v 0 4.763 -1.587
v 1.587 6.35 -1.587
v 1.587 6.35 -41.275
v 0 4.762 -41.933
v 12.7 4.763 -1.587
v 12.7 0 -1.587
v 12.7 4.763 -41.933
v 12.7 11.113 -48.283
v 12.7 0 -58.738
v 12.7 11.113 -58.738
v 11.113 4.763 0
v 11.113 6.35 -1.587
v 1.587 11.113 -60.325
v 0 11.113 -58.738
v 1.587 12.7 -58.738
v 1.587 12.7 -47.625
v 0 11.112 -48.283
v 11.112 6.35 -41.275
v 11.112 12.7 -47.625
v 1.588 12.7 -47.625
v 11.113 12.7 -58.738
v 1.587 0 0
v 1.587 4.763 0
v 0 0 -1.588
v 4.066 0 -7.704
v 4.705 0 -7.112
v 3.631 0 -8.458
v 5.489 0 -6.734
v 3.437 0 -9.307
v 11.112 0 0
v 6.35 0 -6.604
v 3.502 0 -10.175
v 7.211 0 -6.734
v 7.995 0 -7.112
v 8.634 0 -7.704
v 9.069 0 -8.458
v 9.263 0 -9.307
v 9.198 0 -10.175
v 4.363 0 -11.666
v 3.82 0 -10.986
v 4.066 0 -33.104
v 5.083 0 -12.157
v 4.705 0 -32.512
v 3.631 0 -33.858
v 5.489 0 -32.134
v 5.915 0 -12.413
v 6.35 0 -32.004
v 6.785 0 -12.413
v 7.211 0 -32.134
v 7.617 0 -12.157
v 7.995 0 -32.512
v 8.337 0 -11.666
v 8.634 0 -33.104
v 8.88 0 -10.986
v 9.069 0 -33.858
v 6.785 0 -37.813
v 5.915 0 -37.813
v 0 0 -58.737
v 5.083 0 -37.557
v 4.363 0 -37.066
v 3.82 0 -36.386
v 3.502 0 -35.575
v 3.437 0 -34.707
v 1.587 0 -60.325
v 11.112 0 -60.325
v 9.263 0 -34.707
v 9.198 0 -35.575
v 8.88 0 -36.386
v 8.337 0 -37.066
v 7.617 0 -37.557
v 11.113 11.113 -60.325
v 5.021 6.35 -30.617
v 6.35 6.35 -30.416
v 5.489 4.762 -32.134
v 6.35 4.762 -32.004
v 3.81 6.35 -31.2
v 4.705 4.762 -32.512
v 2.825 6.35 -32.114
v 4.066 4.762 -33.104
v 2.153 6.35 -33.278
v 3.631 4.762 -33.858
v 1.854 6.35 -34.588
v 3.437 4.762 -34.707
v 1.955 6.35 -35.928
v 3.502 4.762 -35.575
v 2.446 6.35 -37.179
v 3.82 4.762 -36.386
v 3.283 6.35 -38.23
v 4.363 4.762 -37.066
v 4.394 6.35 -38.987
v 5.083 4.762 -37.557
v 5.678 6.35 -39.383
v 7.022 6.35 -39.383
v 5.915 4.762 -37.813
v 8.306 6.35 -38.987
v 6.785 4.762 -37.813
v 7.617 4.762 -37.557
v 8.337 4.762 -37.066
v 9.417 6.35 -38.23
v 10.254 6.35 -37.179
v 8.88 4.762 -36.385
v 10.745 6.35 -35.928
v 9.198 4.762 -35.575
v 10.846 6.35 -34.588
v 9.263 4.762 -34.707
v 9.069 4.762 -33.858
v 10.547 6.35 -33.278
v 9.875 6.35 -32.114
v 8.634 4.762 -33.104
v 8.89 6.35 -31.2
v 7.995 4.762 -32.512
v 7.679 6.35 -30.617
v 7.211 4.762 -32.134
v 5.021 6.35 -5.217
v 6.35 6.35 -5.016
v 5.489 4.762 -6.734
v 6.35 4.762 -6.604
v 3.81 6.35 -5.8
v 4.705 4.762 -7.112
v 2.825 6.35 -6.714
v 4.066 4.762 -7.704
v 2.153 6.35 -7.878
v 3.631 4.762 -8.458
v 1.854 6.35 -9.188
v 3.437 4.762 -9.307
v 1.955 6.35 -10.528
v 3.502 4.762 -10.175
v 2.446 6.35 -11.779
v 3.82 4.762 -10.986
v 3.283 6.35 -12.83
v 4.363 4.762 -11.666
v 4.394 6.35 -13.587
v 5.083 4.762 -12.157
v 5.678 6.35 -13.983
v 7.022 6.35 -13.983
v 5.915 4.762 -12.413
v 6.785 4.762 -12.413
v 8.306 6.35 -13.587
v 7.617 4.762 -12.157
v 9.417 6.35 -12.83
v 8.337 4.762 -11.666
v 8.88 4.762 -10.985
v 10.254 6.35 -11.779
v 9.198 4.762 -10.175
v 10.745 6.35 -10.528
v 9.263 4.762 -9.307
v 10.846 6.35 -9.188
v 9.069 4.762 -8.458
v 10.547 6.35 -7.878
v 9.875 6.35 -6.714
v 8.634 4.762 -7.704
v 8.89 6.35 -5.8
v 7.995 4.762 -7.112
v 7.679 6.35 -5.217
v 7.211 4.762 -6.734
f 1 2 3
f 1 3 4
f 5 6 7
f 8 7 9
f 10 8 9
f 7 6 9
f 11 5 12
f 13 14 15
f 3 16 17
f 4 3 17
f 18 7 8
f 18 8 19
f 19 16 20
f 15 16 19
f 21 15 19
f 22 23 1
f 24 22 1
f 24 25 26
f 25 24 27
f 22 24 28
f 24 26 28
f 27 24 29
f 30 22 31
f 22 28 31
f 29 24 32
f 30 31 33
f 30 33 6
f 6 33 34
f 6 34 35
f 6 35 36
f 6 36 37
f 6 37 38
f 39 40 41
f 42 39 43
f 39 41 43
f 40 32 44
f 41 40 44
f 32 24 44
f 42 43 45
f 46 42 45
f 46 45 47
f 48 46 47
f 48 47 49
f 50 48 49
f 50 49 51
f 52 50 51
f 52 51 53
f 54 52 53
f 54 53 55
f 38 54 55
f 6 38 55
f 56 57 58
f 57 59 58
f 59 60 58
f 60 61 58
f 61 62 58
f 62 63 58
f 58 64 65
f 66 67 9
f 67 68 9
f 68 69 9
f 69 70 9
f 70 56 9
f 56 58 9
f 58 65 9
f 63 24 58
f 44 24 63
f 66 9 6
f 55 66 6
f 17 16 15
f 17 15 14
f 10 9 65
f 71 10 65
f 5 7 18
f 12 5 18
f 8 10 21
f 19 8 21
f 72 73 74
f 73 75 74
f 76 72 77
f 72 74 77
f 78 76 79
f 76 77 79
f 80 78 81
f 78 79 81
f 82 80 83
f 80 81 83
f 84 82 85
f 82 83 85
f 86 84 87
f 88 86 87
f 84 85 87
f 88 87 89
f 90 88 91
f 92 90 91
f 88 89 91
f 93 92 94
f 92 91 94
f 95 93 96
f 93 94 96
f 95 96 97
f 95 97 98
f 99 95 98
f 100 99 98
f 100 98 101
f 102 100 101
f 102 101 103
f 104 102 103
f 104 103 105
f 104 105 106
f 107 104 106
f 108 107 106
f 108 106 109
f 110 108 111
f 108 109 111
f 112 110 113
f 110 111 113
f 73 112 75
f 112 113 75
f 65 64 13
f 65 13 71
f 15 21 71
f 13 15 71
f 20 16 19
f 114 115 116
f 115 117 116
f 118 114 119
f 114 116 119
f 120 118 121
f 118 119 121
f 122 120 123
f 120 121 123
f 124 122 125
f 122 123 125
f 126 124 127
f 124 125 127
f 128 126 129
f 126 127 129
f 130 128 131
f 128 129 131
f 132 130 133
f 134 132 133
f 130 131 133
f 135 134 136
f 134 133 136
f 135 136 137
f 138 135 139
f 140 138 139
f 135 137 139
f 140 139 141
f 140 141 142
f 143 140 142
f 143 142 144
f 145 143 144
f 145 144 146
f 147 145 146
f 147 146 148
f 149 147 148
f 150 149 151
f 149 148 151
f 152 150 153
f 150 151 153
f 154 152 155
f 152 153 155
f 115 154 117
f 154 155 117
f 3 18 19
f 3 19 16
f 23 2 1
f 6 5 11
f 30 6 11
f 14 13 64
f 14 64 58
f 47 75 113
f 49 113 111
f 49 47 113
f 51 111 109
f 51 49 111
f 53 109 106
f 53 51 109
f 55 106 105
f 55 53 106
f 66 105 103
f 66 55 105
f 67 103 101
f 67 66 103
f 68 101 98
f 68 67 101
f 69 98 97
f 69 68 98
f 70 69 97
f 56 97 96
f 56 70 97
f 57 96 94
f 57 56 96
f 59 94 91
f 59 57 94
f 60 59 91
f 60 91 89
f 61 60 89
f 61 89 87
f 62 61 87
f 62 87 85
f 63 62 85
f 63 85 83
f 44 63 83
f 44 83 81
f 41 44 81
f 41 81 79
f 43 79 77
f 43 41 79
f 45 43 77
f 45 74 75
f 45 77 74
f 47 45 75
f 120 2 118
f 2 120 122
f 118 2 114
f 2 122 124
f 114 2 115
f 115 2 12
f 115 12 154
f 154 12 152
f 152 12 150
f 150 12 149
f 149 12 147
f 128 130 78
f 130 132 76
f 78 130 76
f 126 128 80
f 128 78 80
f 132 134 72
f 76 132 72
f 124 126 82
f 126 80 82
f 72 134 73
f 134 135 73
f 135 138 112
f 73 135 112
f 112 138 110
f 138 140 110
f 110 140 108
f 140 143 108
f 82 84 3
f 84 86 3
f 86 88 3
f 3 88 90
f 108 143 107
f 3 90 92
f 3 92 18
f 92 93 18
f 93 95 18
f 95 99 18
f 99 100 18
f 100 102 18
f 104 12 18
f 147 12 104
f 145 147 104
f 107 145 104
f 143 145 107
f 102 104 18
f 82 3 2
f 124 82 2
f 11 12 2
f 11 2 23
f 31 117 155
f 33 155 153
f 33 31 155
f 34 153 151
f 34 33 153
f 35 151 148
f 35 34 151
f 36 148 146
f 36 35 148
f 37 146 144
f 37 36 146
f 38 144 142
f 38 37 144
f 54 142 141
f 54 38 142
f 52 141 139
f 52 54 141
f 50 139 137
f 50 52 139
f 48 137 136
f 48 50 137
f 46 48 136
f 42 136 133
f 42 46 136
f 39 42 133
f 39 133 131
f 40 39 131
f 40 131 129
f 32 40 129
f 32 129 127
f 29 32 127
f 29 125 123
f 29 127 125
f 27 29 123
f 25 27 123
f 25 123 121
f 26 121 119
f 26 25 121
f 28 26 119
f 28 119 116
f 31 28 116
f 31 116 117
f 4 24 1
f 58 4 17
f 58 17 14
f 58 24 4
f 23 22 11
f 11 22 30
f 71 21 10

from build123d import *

# Parameters (mm, degrees)
SKETCH1_W           = 12.7
SKETCH1_H           = 60.325
SKETCH1_R           = 2.921
BOSS_EXTRUDE1_DEPTH = 12.7
SKETCH2_W           = 47.625
SKETCH2_H           = 6.35
CUT_EXTRUDE1_DEPTH  = 63.941922635
CHAMFER1_SIZE       = 6.35


# Some blends are built 0.0001 mm under size
with BuildPart() as part:
    # Sketch1 → Boss-Extrude1 (new body)
    with BuildSketch(Plane(origin=(0, 0, 0), x_dir=(1, 0, 0), z_dir=(0, 1, 0))):
        with Locations((6.35, 30.1625)):
            Rectangle(SKETCH1_W, SKETCH1_H)
        with Locations(Location((6.35, 9.525, 0), (0, 0, 270))):
            Circle(SKETCH1_R, mode=Mode.SUBTRACT)
        with Locations(Location((6.35, 34.925, 0), (0, 0, 270))):
            Circle(SKETCH1_R, mode=Mode.SUBTRACT)
    extrude(amount=BOSS_EXTRUDE1_DEPTH)

    # Sketch2 → Cut-Extrude1 (cut, through all)
    with BuildSketch(Plane(origin=(12.7, 0, 0), x_dir=(0, 0, -1), z_dir=(1, 0, 0))):
        with Locations((23.8125, 9.525)):
            Rectangle(SKETCH2_W, SKETCH2_H)
    extrude(amount=-CUT_EXTRUDE1_DEPTH, mode=Mode.SUBTRACT)

    # Chamfer1
    chamfer1_edges = [part.edges().sort_by_distance(p)[0] for p in [
        (6.35, 6.35, -47.625),
    ]]
    chamfer(chamfer1_edges, length=CHAMFER1_SIZE - 0.0001)  # a hair under: the kernel refuses the full size

    # Chamfer2
    # the kernel refuses this chamfer: 1.5875 mm, written as the material it takes off along each edge
    with BuildSketch(Plane(origin=(11.641666667, 11.641666667, -59.266666667), x_dir=(-0.7071067811865476, 0.7071067811865476, 0), z_dir=(0.5773502691896255, 0.5773502691896255, -0.5773502691896263)), Plane(origin=(1.058333333, 5.291666667, -1.058333333), x_dir=(0.7071067811865476, 0.7071067811865476, 0), z_dir=(-0.5773502691896255, 0.5773502691896255, 0.5773502691896261))) as chamfer2_piece_1:
        Polygon((-1.122532015, 0.648094161), (1.122532015, 0.648094161), (0, -1.296188322), align=None)
    extrude(amount=2.016395815, mode=Mode.SUBTRACT)
    with BuildSketch(Plane(origin=(1.058333333, 11.641666667, -59.266666667), x_dir=(0.7071067811865476, 0.7071067811865476, 0), z_dir=(-0.5773502691896255, 0.5773502691896255, -0.5773502691896263)), Plane(origin=(11.641666667, 5.291666667, -1.058333333), x_dir=(-0.7071067811865476, 0.7071067811865476, 0), z_dir=(0.577350269189626, 0.5773502691896254, 0.5773502691896262))) as chamfer2_piece_2:
        Polygon((-1.122532015, -0.648094161), (1.122532015, -0.648094161), (0, 1.296188322), align=None)
    extrude(amount=2.016395815, mode=Mode.SUBTRACT)
    with BuildSketch(Plane(origin=(16.782546743, 12.7, -60.325), x_dir=(0, 0.027495876610586785, 0.9996219169112966), z_dir=(-1, 0, 0)), Plane(origin=(0, 12.7, -64.407546743), x_dir=(0.9996219169112968, 0.02749587661058674, 0), z_dir=(0, 0, 1)), Plane(origin=(0, -4.082546743, -60.325), x_dir=(0.9996219169112968, 0, -0.02749587661058565), z_dir=(0, 1, 0)), Plane(origin=(12.7, -4.082546743, -60.325), x_dir=(0.027495876610586785, 0, 0.9996219169112966), z_dir=(0, 1, 0))) as chamfer2_piece_3:
        with BuildLine():
            Line((1.633018697, 0), (-0.089768608, -1.630549497))
            Line((-0.089768608, -1.630549497), (-0.121506604, -1.629676503))
            ThreePointArc((-0.121506604, -1.629676503), (-0.054180148, -0.815019055), (-0.031737996, 0.000872994))
            Line((-0.031737996, 0.000872994), (0.000872994, 0.031737996))
            ThreePointArc((0.000872994, 0.031737996), (0.816765043, 0.009295844), (1.633891691, 0.031737996))
            Line((1.633891691, 0.031737996), (1.633018697, 0))
        make_face()
    extrude(amount=20.865093487, mode=Mode.SUBTRACT)
    with BuildSketch(Plane(origin=(12.7, 12.7, -43.542453257), x_dir=(0.027495876610586726, -0.9996219169112968, 0), z_dir=(0, 0, -1)), Plane(origin=(16.782546743, 6.35, 0), x_dir=(0, 0.027495876610586223, -0.9996219169112968), z_dir=(-1, 0, 0))) as chamfer2_piece_4:
        with BuildLine():
            Line((1.633018697, 0), (-0.089768608, 1.630549497))
            Line((-0.089768608, 1.630549497), (-0.121506604, 1.629676503))
            ThreePointArc((-0.121506604, 1.629676503), (-0.054180148, 0.815019055), (-0.031737996, -0.000872994))
            Line((-0.031737996, -0.000872994), (0.000872994, -0.031737996))
            ThreePointArc((0.000872994, -0.031737996), (0.816765043, -0.009295844), (1.633891691, -0.031737996))
            Line((1.633891691, -0.031737996), (1.633018697, 0))
        make_face()
    extrude(amount=20.865093487, mode=Mode.SUBTRACT)
    with BuildSketch(Plane(origin=(12.7, -4.082546743, 0), x_dir=(0.027495876610586743, 0, -0.9996219169112966), z_dir=(0, 1, 0)), Plane(origin=(0, -4.082546743, 0), x_dir=(0.9996219169112966, 0, 0.027495876610586355), z_dir=(0, 1, 0))) as chamfer2_piece_5:
        with BuildLine():
            Line((1.633018697, 0), (-0.089768608, 1.630549497))
            Line((-0.089768608, 1.630549497), (-0.121506604, 1.629676503))
            ThreePointArc((-0.121506604, 1.629676503), (-0.054180148, 0.815019055), (-0.031737996, -0.000872994))
            Line((-0.031737996, -0.000872994), (0.000872994, -0.031737996))
            ThreePointArc((0.000872994, -0.031737996), (0.816765043, -0.009295844), (1.633891691, -0.031737996))
            Line((1.633891691, -0.031737996), (1.633018697, 0))
        make_face()
    extrude(amount=14.515093487, mode=Mode.SUBTRACT)
    with BuildSketch(Plane(origin=(6.35, 6.35, -9.525), x_dir=(0, 0, 1), z_dir=(1, 0, 0))) as chamfer2_piece_6:
        with BuildLine():
            Line((4.553401281, -0.044901281), (2.876098719, 1.632401281))
            Line((2.876098719, 1.632401281), (2.844348719, 1.632401281))
            ThreePointArc((2.844348719, 1.632401281), (2.88925, 0.81620064), (2.88925, 0))
            Line((2.88925, 0), (2.921, -0.03175))
            ThreePointArc((2.921, -0.03175), (3.73720064, -0.03175), (4.553401281, -0.076651281))
            Line((4.553401281, -0.076651281), (4.553401281, -0.044901281))
        make_face()
    revolve(axis=Axis((6.35, 6.35, -9.525), (0, -1, 0)), mode=Mode.SUBTRACT)
    with BuildSketch(Plane(origin=(6.35, 6.35, -34.925), x_dir=(0, 0, 1), z_dir=(1, 0, 0))) as chamfer2_piece_7:
        with BuildLine():
            Line((4.553401281, -0.044901281), (2.876098719, 1.632401281))
            Line((2.876098719, 1.632401281), (2.844348719, 1.632401281))
            ThreePointArc((2.844348719, 1.632401281), (2.88925, 0.81620064), (2.88925, 0))
            Line((2.88925, 0), (2.921, -0.03175))
            ThreePointArc((2.921, -0.03175), (3.73720064, -0.03175), (4.553401281, -0.076651281))
            Line((4.553401281, -0.076651281), (4.553401281, -0.044901281))
        make_face()
    revolve(axis=Axis((6.35, 6.35, -34.925), (0, -1, 0)), mode=Mode.SUBTRACT)
    with BuildSketch(Plane(origin=(0, 6.35, -45.357646743), x_dir=(0.9996219169112968, 0.027495876610586195, 0), z_dir=(0, 0, 1))) as chamfer2_piece_8_section:
        with BuildLine():
            Line((1.633018697, 0), (-0.089768608, -1.630549497))
            Line((-0.089768608, -1.630549497), (-0.121506604, -1.629676503))
            ThreePointArc((-0.121506604, -1.629676503), (-0.054180148, -0.815019055), (-0.031737996, 0.000872994))
            Line((-0.031737996, 0.000872994), (0.000872994, 0.031737996))
            ThreePointArc((0.000872994, 0.031737996), (0.816765043, 0.009295844), (1.633891691, 0.031737996))
            Line((1.633891691, 0.031737996), (1.633018697, 0))
        make_face()
    chamfer2_piece_8 = extrude(amount=49.440193487, mode=Mode.PRIVATE)
    chamfer2_piece_8 = split(chamfer2_piece_8, bisect_by=Plane(origin=(0.525455665, -5.379395081, -29.545704919), z_dir=(0, 0.7071067811865474, 0.7071067811865477)), keep=Keep.TOP, mode=Mode.PRIVATE)
    add(chamfer2_piece_8, mode=Mode.SUBTRACT)
    with BuildSketch(Plane(origin=(12.7, 6.35, -45.357646743), x_dir=(0.02749587661058674, -0.9996219169112966, 0), z_dir=(0, 0, 1))) as chamfer2_piece_9_section:
        with BuildLine():
            Line((1.633018697, 0), (-0.089768608, -1.630549497))
            Line((-0.089768608, -1.630549497), (-0.121506604, -1.629676503))
            ThreePointArc((-0.121506604, -1.629676503), (-0.054180148, -0.815019055), (-0.031737996, 0.000872994))
            Line((-0.031737996, 0.000872994), (0.000872994, 0.031737996))
            ThreePointArc((0.000872994, 0.031737996), (0.816765043, 0.009295844), (1.633891691, 0.031737996))
            Line((1.633891691, 0.031737996), (1.633018697, 0))
        make_face()
    chamfer2_piece_9 = extrude(amount=49.440193487, mode=Mode.PRIVATE)
    chamfer2_piece_9 = split(chamfer2_piece_9, bisect_by=Plane(origin=(12.174544335, -5.379395081, -29.545704919), z_dir=(0, 0.7071067811865474, 0.7071067811865477)), keep=Keep.TOP, mode=Mode.PRIVATE)
    add(chamfer2_piece_9, mode=Mode.SUBTRACT)
    with BuildSketch(Plane(origin=(12.7, 3.463203513, -38.388303513), x_dir=(0.027495876610586726, -0.7068394360706733, -0.7068394360706737), z_dir=(0, 0.7071067811865477, -0.7071067811865474))) as chamfer2_piece_10_section:
        with BuildLine():
            Line((1.633018697, 0), (-0.089768608, 1.630549497))
            Line((-0.089768608, 1.630549497), (-0.121506604, 1.629676503))
            ThreePointArc((-0.121506604, 1.629676503), (-0.054180148, 0.815019055), (-0.031737996, -0.000872994))
            Line((-0.031737996, -0.000872994), (0.000872994, -0.031737996))
            ThreePointArc((0.000872994, -0.031737996), (0.816765043, -0.009295844), (1.633891691, -0.031737996))
            Line((1.633891691, -0.031737996), (1.633018697, 0))
        make_face()
    chamfer2_piece_10 = extrude(amount=17.145208187, mode=Mode.PRIVATE)
    chamfer2_piece_10 = split(chamfer2_piece_10, bisect_by=Plane(origin=(12.154882998, 6.35, -44.791724347), z_dir=(0, 1, 0)), keep=Keep.TOP, mode=Mode.PRIVATE)
    add(chamfer2_piece_10, mode=Mode.SUBTRACT)
    with BuildSketch(Plane(origin=(0, 3.463203513, -38.388303513), x_dir=(0.9996219169112968, 0.019442520806014982, 0.019442520806014992), z_dir=(0, 0.7071067811865477, -0.7071067811865474))) as chamfer2_piece_11_section:
        with BuildLine():
            Line((1.633018697, 0), (-0.089768608, 1.630549497))
            Line((-0.089768608, 1.630549497), (-0.121506604, 1.629676503))
            ThreePointArc((-0.121506604, 1.629676503), (-0.054180148, 0.815019055), (-0.031737996, -0.000872994))
            Line((-0.031737996, -0.000872994), (0.000872994, -0.031737996))
            ThreePointArc((0.000872994, -0.031737996), (0.816765043, -0.009295844), (1.633891691, -0.031737996))
            Line((1.633891691, -0.031737996), (1.633018697, 0))
        make_face()
    chamfer2_piece_11 = extrude(amount=17.145208187, mode=Mode.PRIVATE)
    chamfer2_piece_11 = split(chamfer2_piece_11, bisect_by=Plane(origin=(0.545117002, 6.35, -44.791724347), z_dir=(0, 1, 0)), keep=Keep.TOP, mode=Mode.PRIVATE)
    add(chamfer2_piece_11, mode=Mode.SUBTRACT)
    with BuildSketch(Plane(origin=(0, 3.463203513, -38.388303513), x_dir=(0.9996219169112968, 0.019442520806014982, 0.019442520806014992), z_dir=(0, 0.7071067811865477, -0.7071067811865474))) as chamfer2_piece_12a_section:
        with BuildLine():
            Line((1.633018697, 0), (-0.089768608, 1.630549497))
            Line((-0.089768608, 1.630549497), (-0.121506604, 1.629676503))
            ThreePointArc((-0.121506604, 1.629676503), (-0.054180148, 0.815019055), (-0.031737996, -0.000872994))
            Line((-0.031737996, -0.000872994), (0.000872994, -0.031737996))
            ThreePointArc((0.000872994, -0.031737996), (0.816765043, -0.009295844), (1.633891691, -0.031737996))
            Line((1.633891691, -0.031737996), (1.633018697, 0))
        make_face()
    chamfer2_piece_12a = extrude(amount=17.145208187, mode=Mode.PRIVATE)
    chamfer2_piece_12a = split(chamfer2_piece_12a, bisect_by=Plane(origin=(0.504972836, 6.35, -40.423859696), z_dir=(0, -1, 0)), keep=Keep.TOP, mode=Mode.PRIVATE)
    with BuildSketch(Plane(origin=(0, 6.35, -45.357646743), x_dir=(0.9996219169112968, 0.027495876610586195, 0), z_dir=(0, 0, 1))) as chamfer2_piece_12b_section:
        with BuildLine():
            Line((1.633018697, 0), (-0.089768608, -1.630549497))
            Line((-0.089768608, -1.630549497), (-0.121506604, -1.629676503))
            ThreePointArc((-0.121506604, -1.629676503), (-0.054180148, -0.815019055), (-0.031737996, 0.000872994))
            Line((-0.031737996, 0.000872994), (0.000872994, 0.031737996))
            ThreePointArc((0.000872994, 0.031737996), (0.816765043, 0.009295844), (1.633891691, 0.031737996))
            Line((1.633891691, 0.031737996), (1.633018697, 0))
        make_face()
    chamfer2_piece_12b = extrude(amount=49.440193487, mode=Mode.PRIVATE)
    chamfer2_piece_12b = split(chamfer2_piece_12b, bisect_by=Plane(origin=(0.504972836, 6.951917791, -41.877017791), z_dir=(0, -0.7071067811865474, -0.7071067811865477)), keep=Keep.TOP, mode=Mode.PRIVATE)
    chamfer2_piece_12 = chamfer2_piece_12a & chamfer2_piece_12b
    add(chamfer2_piece_12, mode=Mode.SUBTRACT)
    with BuildSketch(Plane(origin=(12.7, 3.463203513, -38.388303513), x_dir=(0.027495876610586726, -0.7068394360706733, -0.7068394360706737), z_dir=(0, 0.7071067811865477, -0.7071067811865474))) as chamfer2_piece_13a_section:
        with BuildLine():
            Line((1.633018697, 0), (-0.089768608, 1.630549497))
            Line((-0.089768608, 1.630549497), (-0.121506604, 1.629676503))
            ThreePointArc((-0.121506604, 1.629676503), (-0.054180148, 0.815019055), (-0.031737996, -0.000872994))
            Line((-0.031737996, -0.000872994), (0.000872994, -0.031737996))
            ThreePointArc((0.000872994, -0.031737996), (0.816765043, -0.009295844), (1.633891691, -0.031737996))
            Line((1.633891691, -0.031737996), (1.633018697, 0))
        make_face()
    chamfer2_piece_13a = extrude(amount=17.145208187, mode=Mode.PRIVATE)
    chamfer2_piece_13a = split(chamfer2_piece_13a, bisect_by=Plane(origin=(12.195027164, 6.35, -40.423859696), z_dir=(0, -1, 0)), keep=Keep.TOP, mode=Mode.PRIVATE)
    with BuildSketch(Plane(origin=(12.7, 6.35, -45.357646743), x_dir=(0.02749587661058674, -0.9996219169112966, 0), z_dir=(0, 0, 1))) as chamfer2_piece_13b_section:
        with BuildLine():
            Line((1.633018697, 0), (-0.089768608, -1.630549497))
            Line((-0.089768608, -1.630549497), (-0.121506604, -1.629676503))
            ThreePointArc((-0.121506604, -1.629676503), (-0.054180148, -0.815019055), (-0.031737996, 0.000872994))
            Line((-0.031737996, 0.000872994), (0.000872994, 0.031737996))
            ThreePointArc((0.000872994, 0.031737996), (0.816765043, 0.009295844), (1.633891691, 0.031737996))
            Line((1.633891691, 0.031737996), (1.633018697, 0))
        make_face()
    chamfer2_piece_13b = extrude(amount=49.440193487, mode=Mode.PRIVATE)
    chamfer2_piece_13b = split(chamfer2_piece_13b, bisect_by=Plane(origin=(12.195027164, 6.951917791, -41.877017791), z_dir=(0, -0.7071067811865474, -0.7071067811865477)), keep=Keep.TOP, mode=Mode.PRIVATE)
    chamfer2_piece_13 = chamfer2_piece_13a & chamfer2_piece_13b
    add(chamfer2_piece_13, mode=Mode.SUBTRACT)


solid = part.part
